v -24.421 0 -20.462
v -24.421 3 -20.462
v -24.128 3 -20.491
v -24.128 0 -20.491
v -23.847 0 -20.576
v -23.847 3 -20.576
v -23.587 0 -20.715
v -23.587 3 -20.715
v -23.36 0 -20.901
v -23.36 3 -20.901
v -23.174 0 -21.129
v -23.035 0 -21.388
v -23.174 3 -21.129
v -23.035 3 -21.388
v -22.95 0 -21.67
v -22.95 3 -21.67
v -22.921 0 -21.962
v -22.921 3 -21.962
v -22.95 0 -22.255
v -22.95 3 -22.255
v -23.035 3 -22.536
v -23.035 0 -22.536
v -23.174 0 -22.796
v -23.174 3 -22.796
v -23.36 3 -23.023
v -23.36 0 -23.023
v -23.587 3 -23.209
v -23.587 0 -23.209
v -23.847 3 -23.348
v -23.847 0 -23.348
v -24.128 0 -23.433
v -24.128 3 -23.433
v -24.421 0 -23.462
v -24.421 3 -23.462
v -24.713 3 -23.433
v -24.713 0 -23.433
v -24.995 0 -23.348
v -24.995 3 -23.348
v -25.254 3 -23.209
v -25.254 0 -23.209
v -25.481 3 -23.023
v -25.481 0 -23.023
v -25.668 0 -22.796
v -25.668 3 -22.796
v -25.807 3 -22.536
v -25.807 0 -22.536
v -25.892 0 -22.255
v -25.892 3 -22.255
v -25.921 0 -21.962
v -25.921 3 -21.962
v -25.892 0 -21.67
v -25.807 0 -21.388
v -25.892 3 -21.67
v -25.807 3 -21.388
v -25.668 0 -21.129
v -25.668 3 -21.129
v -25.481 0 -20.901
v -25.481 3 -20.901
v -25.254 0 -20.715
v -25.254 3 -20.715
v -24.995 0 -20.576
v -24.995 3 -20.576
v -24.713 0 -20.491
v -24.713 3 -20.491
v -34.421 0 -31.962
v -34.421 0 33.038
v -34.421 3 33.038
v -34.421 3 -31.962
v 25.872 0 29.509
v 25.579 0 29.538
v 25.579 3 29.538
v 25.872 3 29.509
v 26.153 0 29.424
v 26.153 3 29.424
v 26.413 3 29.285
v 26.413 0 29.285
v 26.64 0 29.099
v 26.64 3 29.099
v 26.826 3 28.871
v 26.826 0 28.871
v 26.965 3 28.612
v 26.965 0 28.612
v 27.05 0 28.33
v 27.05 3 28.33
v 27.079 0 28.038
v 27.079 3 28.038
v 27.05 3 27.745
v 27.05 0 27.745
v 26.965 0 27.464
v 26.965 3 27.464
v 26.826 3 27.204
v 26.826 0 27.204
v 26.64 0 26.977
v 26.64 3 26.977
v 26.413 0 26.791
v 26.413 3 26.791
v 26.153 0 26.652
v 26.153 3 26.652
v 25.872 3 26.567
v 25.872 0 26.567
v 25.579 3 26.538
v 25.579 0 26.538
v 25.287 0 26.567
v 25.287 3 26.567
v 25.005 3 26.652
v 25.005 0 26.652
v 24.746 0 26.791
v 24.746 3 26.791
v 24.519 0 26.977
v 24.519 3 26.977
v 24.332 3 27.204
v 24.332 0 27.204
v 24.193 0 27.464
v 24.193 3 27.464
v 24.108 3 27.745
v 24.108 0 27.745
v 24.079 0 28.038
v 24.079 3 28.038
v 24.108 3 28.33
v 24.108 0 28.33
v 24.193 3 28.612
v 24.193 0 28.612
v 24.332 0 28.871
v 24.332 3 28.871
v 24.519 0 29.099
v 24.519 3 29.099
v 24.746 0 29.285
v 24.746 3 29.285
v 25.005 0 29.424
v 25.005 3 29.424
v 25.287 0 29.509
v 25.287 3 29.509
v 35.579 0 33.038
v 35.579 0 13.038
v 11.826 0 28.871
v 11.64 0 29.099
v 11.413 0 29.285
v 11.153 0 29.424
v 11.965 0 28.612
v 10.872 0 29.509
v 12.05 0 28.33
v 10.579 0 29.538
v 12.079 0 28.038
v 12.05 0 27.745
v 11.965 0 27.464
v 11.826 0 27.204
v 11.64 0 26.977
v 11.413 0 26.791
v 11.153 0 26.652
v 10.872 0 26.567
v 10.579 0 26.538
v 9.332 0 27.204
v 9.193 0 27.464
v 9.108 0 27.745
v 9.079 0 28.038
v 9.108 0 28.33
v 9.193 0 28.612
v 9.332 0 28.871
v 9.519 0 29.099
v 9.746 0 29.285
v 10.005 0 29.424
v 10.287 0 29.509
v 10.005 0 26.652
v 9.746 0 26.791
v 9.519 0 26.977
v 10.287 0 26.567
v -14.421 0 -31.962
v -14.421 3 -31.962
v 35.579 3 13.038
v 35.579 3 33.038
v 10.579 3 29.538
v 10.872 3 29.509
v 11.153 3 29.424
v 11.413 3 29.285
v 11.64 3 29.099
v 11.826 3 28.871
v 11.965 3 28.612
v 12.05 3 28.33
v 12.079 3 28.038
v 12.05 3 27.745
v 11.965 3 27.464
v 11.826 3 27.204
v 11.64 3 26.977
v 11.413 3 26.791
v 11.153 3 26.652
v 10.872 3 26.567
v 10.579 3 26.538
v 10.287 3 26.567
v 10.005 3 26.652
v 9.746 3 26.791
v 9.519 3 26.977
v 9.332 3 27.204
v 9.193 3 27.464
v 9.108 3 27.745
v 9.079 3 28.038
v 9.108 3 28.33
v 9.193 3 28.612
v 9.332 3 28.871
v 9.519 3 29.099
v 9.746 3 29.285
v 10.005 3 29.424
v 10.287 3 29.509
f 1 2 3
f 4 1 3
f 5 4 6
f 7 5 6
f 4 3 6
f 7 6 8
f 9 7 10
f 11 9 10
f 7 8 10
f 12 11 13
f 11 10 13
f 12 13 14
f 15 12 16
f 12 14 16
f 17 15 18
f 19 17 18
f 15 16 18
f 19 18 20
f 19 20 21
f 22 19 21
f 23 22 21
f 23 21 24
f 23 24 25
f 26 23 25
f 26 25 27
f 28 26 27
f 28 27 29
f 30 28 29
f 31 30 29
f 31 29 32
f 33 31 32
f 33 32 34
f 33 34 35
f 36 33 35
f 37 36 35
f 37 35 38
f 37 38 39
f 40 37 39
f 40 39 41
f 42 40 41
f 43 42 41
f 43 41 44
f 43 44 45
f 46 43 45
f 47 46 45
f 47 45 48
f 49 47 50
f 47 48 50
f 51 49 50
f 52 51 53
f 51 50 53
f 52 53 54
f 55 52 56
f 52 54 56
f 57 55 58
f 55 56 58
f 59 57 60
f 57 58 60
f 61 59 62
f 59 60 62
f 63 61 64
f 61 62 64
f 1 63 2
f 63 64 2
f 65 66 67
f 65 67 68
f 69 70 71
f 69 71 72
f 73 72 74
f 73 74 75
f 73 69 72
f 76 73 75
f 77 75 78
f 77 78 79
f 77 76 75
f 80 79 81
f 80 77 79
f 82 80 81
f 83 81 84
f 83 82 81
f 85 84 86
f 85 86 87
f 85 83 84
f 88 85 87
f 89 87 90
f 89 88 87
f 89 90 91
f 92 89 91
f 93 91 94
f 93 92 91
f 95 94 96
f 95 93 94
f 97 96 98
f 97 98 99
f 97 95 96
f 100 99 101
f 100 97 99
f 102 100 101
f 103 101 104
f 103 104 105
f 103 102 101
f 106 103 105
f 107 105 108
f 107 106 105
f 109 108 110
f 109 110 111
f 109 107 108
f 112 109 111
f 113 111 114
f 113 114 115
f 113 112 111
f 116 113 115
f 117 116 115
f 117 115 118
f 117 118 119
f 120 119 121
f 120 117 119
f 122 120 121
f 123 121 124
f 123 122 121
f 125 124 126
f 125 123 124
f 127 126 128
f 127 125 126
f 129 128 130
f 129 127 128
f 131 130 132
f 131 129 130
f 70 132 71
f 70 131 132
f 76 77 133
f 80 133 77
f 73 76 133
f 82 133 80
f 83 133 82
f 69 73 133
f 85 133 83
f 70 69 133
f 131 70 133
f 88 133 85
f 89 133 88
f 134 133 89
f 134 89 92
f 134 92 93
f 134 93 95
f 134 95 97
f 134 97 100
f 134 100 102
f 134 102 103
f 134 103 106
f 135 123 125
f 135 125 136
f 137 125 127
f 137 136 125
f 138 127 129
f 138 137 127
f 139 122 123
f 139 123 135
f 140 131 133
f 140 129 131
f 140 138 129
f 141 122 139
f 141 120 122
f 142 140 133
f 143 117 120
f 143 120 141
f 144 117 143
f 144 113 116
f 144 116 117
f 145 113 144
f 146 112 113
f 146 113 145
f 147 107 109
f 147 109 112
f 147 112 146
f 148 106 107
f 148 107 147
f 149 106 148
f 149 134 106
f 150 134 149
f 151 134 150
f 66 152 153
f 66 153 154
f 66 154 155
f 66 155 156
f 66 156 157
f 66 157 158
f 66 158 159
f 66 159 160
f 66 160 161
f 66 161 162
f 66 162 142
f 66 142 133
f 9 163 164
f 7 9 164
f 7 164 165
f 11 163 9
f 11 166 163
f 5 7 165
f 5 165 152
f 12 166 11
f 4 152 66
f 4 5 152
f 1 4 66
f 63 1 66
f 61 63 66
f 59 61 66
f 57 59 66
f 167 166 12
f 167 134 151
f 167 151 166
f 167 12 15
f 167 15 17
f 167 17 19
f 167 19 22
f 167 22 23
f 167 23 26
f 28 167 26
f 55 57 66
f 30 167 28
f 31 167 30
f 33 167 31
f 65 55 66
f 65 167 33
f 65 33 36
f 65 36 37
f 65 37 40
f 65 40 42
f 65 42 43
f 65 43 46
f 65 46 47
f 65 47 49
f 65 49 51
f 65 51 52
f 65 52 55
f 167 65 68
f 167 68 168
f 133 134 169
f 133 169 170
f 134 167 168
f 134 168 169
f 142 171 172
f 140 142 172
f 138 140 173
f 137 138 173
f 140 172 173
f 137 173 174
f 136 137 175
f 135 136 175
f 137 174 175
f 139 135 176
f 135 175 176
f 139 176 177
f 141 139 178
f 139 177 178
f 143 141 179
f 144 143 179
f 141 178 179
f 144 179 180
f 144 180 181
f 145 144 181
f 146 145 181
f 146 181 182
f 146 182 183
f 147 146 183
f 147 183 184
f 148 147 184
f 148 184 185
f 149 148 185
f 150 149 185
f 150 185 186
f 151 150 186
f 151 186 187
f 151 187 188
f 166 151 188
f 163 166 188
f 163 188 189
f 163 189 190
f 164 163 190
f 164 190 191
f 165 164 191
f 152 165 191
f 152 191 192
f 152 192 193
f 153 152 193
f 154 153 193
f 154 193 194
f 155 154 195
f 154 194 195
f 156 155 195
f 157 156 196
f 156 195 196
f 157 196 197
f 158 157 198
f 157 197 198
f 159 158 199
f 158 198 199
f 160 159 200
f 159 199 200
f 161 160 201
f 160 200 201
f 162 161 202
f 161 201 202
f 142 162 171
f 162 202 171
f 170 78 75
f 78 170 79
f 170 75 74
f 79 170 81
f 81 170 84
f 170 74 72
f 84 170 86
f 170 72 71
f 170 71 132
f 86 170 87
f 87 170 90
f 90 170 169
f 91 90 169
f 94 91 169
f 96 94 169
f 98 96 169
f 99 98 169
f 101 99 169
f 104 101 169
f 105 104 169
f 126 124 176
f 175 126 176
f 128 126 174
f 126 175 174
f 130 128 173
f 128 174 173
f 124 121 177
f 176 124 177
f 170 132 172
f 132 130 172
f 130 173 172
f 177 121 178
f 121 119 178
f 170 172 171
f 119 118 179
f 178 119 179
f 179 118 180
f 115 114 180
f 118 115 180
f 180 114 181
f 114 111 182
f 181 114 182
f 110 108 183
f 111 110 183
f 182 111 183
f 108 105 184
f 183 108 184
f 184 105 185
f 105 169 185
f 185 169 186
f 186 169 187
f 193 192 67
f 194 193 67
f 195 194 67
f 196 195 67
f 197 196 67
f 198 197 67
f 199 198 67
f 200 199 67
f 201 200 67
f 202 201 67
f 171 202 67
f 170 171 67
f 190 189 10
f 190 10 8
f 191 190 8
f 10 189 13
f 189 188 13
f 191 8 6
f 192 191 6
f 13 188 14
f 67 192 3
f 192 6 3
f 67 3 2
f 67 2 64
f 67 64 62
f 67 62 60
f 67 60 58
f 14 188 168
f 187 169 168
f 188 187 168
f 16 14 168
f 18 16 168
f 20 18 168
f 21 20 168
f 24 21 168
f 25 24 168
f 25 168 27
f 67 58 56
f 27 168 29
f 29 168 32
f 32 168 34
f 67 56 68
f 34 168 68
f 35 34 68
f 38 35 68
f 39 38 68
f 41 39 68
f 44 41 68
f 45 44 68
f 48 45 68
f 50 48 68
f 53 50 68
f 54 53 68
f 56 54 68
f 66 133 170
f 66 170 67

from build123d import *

# Parameters (mm, degrees)
SKETCH1_R           = 1.5
BOSS_EXTRUDE1_DEPTH = 3
SKETCH4_R           = 1.5
CUT_EXTRUDE1_DEPTH  = 5
SKETCH5_R           = 1.5
CUT_EXTRUDE2_DEPTH  = 49.645455777


with BuildPart() as part:
    # Sketch1 → Boss-Extrude1 (new body)
    with BuildSketch(Plane(origin=(0, 0, 0), x_dir=(1, 0, 0), z_dir=(0, 1, 0))):
        Polygon((35.579220967, -33.037848041), (-34.420779033, -33.037848041), (-34.420779033, 31.962151959), (-14.420779033, 31.962151959), (35.579220967, -13.037848041), align=None)
        with Locations(Location((25.579220967, -28.037848041, 0), (0, 0, 270))):
            Circle(SKETCH1_R, mode=Mode.SUBTRACT)
    extrude(amount=BOSS_EXTRUDE1_DEPTH)

    # Sketch4 → Cut-Extrude1 (cut)
    with BuildSketch(Plane(origin=(0, 3, 0), x_dir=(-1, 0, 0), z_dir=(0, 1, 0))):
        with Locations(Location((-10.579220967, 28.037848041, 0), (0, 0, 90))):
            Circle(SKETCH4_R)
    extrude(amount=-CUT_EXTRUDE1_DEPTH, mode=Mode.SUBTRACT)

    # Sketch5 → Cut-Extrude2 (cut, through all)
    with BuildSketch(Plane(origin=(0, 3, 0), x_dir=(-1, 0, 0), z_dir=(0, 1, 0))):
        with Locations(Location((24.420779033, -21.962151959, 0), (0, 0, 90))):
            Circle(SKETCH5_R)
    extrude(amount=-CUT_EXTRUDE2_DEPTH, mode=Mode.SUBTRACT)


solid = part.part
